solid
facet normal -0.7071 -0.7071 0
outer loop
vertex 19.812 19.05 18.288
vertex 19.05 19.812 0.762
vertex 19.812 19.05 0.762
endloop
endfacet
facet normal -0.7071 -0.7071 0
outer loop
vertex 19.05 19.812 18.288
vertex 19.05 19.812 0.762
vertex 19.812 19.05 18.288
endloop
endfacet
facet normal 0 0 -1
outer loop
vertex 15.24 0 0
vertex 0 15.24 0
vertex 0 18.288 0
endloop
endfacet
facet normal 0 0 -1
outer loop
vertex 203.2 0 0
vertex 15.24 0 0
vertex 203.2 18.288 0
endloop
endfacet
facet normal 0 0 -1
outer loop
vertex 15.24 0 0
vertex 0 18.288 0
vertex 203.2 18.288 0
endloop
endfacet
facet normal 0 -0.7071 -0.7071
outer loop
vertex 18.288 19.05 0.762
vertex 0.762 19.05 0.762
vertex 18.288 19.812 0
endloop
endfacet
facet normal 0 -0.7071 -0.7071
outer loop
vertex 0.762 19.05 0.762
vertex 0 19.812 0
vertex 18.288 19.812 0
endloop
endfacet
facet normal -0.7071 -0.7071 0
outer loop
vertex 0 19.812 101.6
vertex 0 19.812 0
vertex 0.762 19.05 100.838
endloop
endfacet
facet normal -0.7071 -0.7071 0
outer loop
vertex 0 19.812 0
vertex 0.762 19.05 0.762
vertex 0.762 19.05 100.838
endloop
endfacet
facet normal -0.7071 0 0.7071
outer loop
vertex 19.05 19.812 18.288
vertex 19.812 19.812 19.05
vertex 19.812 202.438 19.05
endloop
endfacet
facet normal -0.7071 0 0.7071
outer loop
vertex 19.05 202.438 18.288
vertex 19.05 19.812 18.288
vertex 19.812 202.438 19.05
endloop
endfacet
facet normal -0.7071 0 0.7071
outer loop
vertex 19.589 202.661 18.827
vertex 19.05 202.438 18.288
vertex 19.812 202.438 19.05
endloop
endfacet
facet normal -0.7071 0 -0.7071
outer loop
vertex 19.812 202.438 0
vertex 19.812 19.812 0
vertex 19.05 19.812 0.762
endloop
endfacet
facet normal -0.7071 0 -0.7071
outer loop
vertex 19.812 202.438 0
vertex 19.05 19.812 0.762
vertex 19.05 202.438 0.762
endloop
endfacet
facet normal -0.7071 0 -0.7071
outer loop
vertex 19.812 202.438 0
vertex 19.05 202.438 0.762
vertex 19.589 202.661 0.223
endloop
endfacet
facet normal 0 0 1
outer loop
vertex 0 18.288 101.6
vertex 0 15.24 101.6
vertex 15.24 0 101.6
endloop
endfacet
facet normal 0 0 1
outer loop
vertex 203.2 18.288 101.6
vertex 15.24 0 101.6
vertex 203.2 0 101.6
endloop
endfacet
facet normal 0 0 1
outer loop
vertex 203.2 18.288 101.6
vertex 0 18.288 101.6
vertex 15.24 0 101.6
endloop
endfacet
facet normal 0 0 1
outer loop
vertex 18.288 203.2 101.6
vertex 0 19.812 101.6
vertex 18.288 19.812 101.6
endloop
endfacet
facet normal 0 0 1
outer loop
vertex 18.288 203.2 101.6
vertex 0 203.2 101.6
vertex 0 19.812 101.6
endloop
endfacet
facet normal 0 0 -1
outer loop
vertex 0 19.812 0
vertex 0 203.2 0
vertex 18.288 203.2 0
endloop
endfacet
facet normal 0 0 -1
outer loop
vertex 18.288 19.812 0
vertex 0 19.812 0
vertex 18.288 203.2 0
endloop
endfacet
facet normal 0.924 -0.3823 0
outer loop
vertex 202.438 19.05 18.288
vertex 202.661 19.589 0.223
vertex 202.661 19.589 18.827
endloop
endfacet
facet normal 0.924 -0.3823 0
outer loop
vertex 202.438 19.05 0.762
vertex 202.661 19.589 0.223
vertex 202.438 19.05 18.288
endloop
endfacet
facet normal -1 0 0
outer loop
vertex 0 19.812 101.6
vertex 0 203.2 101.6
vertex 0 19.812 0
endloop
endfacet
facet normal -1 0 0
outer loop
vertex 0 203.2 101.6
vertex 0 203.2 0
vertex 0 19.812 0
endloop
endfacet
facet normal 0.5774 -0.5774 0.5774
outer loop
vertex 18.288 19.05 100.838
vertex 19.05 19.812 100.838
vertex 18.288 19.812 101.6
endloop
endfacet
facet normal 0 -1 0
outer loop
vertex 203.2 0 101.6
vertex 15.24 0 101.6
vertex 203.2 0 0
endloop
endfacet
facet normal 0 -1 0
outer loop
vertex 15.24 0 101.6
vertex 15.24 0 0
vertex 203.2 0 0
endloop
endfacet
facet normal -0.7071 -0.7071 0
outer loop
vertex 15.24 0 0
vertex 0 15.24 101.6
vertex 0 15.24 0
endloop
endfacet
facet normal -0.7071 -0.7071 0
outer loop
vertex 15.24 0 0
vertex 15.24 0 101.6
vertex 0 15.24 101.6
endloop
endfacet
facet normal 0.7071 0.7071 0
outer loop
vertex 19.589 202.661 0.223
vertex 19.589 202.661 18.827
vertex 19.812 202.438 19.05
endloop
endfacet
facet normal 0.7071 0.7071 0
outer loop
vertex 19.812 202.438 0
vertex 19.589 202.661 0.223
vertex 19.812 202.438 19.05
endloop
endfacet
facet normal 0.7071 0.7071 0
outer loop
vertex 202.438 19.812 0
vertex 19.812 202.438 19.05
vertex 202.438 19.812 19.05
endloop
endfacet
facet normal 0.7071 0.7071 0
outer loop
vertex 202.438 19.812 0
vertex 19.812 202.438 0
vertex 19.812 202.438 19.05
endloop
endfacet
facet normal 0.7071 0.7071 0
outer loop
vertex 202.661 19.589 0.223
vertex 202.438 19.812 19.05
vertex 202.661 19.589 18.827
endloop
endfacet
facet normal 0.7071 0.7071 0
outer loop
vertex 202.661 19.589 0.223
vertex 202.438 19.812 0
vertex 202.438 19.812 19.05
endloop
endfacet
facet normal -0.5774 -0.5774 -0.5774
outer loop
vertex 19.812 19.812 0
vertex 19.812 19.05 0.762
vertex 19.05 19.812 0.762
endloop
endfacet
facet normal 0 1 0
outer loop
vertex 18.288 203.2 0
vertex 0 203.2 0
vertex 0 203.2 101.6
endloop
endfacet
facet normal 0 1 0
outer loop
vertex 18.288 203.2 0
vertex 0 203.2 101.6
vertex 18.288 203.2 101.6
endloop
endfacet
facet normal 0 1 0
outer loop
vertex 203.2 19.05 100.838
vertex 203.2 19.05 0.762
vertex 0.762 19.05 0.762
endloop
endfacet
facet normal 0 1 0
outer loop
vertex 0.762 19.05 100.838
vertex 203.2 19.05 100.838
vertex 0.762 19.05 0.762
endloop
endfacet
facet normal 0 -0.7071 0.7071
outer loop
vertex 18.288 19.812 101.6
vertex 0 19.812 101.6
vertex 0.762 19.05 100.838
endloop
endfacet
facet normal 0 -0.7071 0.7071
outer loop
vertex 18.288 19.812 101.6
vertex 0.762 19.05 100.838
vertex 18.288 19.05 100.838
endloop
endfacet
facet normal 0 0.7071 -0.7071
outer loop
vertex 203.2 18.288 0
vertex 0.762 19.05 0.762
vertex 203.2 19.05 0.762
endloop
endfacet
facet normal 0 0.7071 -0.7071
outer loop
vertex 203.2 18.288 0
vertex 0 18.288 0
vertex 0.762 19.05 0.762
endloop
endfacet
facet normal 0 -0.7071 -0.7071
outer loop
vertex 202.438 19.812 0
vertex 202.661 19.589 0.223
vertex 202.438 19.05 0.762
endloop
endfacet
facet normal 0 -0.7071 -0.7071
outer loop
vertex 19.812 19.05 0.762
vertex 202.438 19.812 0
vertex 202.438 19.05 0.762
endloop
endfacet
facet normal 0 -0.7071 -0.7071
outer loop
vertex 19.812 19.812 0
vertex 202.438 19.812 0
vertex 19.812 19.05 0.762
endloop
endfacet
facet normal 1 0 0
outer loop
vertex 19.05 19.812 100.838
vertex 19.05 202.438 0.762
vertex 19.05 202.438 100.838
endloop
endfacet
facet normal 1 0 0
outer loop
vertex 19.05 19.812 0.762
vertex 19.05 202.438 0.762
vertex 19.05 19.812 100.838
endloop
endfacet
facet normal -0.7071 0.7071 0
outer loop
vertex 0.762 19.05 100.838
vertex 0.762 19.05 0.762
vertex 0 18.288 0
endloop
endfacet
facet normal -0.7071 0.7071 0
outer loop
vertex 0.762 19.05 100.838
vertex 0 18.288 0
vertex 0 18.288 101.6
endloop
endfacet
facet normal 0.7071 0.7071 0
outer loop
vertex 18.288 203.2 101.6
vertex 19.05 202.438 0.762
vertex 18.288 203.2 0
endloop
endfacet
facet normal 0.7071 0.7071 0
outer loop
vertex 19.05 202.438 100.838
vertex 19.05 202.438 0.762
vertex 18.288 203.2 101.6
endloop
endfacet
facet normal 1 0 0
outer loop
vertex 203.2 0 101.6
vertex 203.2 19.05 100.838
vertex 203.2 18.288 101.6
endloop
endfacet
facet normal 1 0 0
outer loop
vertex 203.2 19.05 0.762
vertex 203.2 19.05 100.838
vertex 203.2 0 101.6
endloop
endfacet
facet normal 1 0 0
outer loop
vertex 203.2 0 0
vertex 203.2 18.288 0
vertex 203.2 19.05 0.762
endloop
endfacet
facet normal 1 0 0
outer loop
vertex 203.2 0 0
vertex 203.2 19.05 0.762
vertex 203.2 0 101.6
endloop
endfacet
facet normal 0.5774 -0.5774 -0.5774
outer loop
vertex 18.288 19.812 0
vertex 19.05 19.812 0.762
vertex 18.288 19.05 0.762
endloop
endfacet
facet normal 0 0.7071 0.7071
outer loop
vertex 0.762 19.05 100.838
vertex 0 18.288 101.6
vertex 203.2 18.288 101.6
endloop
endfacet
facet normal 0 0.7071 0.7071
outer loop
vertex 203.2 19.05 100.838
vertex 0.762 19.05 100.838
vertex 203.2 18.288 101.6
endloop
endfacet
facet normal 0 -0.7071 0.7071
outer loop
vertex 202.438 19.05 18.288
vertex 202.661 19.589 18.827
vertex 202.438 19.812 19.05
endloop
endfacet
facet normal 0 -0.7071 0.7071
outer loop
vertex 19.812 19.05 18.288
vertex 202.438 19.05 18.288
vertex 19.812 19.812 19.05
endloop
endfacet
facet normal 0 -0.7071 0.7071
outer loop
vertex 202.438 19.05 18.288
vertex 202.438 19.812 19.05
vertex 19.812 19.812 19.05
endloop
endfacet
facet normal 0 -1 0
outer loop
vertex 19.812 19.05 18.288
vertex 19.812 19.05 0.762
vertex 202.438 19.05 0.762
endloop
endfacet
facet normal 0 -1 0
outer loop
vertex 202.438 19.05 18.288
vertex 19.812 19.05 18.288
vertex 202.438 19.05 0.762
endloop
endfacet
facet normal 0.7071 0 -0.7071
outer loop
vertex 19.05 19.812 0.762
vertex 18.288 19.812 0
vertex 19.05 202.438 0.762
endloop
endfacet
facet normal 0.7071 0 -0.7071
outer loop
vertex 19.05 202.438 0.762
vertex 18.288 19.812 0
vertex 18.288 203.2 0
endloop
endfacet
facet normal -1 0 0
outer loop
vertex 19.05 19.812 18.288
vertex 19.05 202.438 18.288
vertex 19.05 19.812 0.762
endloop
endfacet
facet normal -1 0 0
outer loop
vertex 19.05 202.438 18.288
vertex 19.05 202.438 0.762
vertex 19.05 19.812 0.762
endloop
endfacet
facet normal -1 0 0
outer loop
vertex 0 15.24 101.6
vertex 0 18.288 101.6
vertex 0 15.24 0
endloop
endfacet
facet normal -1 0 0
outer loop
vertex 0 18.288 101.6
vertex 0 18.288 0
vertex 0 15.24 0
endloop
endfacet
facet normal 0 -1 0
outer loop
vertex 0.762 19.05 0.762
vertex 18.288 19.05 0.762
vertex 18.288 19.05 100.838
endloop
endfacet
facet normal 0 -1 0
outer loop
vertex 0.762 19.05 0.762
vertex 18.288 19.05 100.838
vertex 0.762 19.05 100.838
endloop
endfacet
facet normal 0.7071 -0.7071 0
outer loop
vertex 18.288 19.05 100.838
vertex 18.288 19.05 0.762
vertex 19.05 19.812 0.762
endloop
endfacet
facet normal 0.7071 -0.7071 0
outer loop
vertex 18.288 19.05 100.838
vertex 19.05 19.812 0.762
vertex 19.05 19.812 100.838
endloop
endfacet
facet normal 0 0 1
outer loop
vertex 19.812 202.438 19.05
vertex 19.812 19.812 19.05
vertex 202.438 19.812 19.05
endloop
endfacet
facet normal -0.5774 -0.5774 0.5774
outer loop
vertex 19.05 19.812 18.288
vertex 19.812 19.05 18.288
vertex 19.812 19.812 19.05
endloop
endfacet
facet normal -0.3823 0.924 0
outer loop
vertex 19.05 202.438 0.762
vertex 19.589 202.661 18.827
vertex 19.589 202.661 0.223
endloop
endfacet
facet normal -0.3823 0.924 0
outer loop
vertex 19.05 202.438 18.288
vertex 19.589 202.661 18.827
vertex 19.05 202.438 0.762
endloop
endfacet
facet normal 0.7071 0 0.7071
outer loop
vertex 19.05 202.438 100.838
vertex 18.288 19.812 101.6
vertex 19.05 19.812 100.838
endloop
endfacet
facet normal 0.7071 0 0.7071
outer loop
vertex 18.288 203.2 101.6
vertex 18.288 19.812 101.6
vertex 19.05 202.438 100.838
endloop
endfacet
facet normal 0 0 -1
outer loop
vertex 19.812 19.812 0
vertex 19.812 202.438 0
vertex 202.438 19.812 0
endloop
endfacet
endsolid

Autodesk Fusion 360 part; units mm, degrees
sketch "Sketch1" plane through (0, 0, 0) normal (0, 0, 1) x (1, 0, 0)
  line L0 (0, 0) -> (203.2, 0)
  line L1 (203.2, 0) -> (203.2, 203.2) construction
  line L2 (203.2, 203.2) -> (0, 203.2) construction
  line L3 (0, 203.2) -> (0, 0)
  line L4 (203.2, 203.2) -> (19.05, 203.2) construction
  line L5 (19.05, 203.2) -> (19.05, 19.05)
  line L6 (19.05, 19.05) -> (203.2, 19.05)
  line L7 (203.2, 19.05) -> (203.2, 203.2) construction
  line L8 (0, 203.2) -> (19.05, 203.2)
  line L9 (203.2, 19.05) -> (203.2, 0)
  line L10 (19.05, 19.05) -> (0, 19.05)
  line L11 (19.05, 203.2) -> (203.2, 19.05)
  dimension "d1" = 203.2
  dimension "d3" = 203.2
  dimension "d4" = 184.15
  dimension "d5" = 184.15
extrude "Extrude1" add sketch "Sketch1" along normal blind 19.05 contours L5 L6 L11 makes body 1 in component "Bottom"
chamfer "Chamfer1" distance 0.762 angle 45 2 faces at (141.8167, 19.05, 6.35) (19.05, 80.4333, 12.7) on bodies 1 in component "Bottom"
extrude "Extrude1'" add sketch "Sketch1" along normal blind 101.6 separate body contours L3 L5 L8 L10 makes body 2 in component "Side 1"
chamfer "Chamfer1'" distance 0.762 angle 45 2 faces at (19.05, 141.8167, 33.8667) (12.7, 19.05, 33.8667) on bodies 2 in component "Side 1"
extrude "Extrude1''" add sketch "Sketch1" along normal blind 101.6 separate body contours L0 L3 L6 L9 L10 makes body 3 in component "Side 2"
chamfer "Chamfer2" distance 0.762 angle 45 2 faces at (12.7, 19.05, 33.8667) (80.4333, 19.05, 33.8667) on bodies 3 in component "Side 2"
chamfer "Chamfer1''" distance 15.24 angle 45 1 edges at (0, 0, 50.8) on bodies 3 in component "Side 2"
component "Bottom" placed x (1, 0, 0) y (0, 1, 0) z (0, 0, 1) at (0, 0, 0)
component "Side 1" placed x (1, 0, 0) y (0, 1, 0) z (0, 0, 1) at (0, 0, 0)
component "Side 2" placed x (1, 0, 0) y (0, 1, 0) z (0, 0, 1) at (0, 0, 0)
equation "d3 = d1"
equation "d4 = d1 - 0.75 in"
equation "d5 = d4"
